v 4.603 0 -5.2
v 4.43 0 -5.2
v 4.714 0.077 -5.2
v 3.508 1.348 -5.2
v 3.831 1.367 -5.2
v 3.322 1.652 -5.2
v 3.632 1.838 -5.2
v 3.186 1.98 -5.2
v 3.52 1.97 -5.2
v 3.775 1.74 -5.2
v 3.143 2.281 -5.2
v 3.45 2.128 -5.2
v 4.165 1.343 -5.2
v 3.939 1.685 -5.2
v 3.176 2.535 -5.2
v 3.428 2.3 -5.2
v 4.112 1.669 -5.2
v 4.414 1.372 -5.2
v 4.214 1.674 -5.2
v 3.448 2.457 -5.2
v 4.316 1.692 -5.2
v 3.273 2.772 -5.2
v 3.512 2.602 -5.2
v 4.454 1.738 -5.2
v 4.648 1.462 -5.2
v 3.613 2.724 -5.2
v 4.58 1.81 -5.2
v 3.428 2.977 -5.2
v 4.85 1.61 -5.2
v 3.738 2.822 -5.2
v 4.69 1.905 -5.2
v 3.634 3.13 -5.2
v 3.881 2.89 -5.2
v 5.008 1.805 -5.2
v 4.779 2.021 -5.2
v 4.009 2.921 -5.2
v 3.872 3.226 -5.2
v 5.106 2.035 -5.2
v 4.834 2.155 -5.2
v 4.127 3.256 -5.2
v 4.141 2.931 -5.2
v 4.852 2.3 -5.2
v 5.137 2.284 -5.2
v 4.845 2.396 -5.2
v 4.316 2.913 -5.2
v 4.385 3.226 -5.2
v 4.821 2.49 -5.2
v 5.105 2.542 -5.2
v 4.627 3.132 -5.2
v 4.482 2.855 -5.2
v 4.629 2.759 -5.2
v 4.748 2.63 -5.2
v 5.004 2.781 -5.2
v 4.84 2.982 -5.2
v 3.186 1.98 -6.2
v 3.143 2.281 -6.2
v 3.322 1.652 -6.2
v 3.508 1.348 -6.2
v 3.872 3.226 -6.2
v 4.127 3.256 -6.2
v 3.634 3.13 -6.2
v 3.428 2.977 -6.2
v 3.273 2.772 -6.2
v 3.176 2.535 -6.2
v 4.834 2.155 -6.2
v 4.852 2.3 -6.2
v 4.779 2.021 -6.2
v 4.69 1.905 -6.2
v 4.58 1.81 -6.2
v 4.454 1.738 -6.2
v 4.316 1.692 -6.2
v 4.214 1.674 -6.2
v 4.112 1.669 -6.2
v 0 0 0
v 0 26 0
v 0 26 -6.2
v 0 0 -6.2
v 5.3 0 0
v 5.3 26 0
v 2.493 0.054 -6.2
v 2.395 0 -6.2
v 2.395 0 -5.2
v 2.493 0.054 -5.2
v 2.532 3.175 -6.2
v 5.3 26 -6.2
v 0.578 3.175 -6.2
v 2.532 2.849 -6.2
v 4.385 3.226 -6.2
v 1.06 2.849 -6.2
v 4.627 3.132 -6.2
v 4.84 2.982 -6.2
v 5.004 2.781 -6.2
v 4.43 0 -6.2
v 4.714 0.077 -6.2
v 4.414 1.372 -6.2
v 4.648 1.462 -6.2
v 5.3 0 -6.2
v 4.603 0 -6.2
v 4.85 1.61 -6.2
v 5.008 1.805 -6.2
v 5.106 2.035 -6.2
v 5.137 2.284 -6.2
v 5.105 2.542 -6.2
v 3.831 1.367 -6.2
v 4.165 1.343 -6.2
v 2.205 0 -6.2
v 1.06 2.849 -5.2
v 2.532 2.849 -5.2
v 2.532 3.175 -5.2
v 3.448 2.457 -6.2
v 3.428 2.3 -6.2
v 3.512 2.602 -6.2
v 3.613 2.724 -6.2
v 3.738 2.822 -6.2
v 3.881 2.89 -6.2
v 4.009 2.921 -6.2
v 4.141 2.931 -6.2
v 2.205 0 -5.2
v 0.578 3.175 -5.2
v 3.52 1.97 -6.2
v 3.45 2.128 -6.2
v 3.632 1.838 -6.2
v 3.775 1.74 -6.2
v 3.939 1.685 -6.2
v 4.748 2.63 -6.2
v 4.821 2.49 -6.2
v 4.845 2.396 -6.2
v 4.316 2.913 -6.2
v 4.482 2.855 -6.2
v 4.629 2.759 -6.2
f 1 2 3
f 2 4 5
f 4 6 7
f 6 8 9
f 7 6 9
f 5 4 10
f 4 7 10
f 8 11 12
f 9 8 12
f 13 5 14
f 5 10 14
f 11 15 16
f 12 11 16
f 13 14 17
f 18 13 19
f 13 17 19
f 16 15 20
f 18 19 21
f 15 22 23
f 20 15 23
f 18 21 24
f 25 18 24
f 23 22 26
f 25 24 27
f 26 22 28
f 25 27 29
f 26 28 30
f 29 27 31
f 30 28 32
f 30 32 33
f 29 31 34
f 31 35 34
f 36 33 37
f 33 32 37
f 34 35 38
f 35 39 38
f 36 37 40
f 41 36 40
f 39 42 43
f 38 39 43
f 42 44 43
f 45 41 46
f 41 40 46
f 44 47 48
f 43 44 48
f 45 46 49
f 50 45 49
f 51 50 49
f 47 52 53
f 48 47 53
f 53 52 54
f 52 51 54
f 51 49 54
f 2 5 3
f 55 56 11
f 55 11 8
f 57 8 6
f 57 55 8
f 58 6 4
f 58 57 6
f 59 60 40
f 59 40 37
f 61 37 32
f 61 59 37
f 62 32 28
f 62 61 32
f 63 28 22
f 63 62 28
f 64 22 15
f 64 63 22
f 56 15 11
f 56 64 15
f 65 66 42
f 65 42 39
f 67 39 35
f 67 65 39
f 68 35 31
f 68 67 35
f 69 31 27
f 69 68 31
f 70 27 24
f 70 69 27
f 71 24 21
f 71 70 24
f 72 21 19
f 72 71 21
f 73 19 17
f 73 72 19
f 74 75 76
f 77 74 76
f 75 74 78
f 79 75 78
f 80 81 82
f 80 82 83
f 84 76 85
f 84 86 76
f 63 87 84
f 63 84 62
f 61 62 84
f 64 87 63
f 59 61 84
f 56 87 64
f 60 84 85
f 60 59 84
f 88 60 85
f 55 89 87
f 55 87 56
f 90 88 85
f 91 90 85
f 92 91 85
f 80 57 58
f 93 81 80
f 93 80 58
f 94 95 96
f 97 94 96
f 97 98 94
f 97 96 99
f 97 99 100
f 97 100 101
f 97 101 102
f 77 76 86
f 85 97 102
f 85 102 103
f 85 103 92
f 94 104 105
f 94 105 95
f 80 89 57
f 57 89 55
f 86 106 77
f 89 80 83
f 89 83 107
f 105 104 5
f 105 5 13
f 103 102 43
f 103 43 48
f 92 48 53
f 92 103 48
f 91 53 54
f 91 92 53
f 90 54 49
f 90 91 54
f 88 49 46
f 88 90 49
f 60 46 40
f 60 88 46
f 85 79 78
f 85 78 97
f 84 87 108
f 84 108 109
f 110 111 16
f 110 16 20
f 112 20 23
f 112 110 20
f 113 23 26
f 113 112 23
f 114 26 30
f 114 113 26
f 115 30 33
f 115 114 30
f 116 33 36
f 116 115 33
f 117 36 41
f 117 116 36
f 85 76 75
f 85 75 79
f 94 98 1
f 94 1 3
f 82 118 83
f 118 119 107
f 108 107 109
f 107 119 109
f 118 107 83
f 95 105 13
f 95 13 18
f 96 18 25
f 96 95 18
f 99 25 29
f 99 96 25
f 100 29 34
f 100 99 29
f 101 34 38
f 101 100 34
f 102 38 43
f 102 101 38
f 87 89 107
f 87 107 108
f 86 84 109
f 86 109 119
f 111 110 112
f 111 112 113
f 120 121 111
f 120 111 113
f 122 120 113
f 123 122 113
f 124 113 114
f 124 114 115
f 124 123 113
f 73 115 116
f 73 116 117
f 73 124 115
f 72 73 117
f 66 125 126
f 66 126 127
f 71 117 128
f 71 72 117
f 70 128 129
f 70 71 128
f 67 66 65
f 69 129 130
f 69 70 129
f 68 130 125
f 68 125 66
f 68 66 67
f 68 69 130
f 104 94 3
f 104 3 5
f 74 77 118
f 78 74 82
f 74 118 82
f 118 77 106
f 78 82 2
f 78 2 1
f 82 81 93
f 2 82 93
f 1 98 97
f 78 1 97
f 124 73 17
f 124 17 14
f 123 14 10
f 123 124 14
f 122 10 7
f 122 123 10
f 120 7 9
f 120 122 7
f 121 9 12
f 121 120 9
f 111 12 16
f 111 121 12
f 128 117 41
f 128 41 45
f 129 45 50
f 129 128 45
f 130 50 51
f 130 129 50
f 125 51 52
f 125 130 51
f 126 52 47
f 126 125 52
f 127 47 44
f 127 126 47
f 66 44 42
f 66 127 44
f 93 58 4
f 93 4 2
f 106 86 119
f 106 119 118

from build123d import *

# Parameters (mm, degrees)
SKETCH1_W           = 5.3
SKETCH1_H           = 6.2
BOSS_EXTRUDE1_DEPTH = 26
CUT_EXTRUDE1_DEPTH  = 1


with BuildPart() as part:
    # Sketch1 → Boss-Extrude1 (new body)
    with BuildSketch(Plane(origin=(0, 0, 0), x_dir=(1, 0, 0), z_dir=(0, 1, 0))):
        with Locations((2.65, 3.1)):
            Rectangle(SKETCH1_W, SKETCH1_H)
    extrude(amount=BOSS_EXTRUDE1_DEPTH)

    # Sketch2 → Cut-Extrude1 (cut)
    with BuildSketch(Plane(origin=(0, 0, -6.2), x_dir=(-1, 0, 0), z_dir=(0, 0, -1))):
        with BuildLine():
            Line((-4.485897436, -0.081410256), (-4.713591747, 0.076958133))
            Line((-4.713591747, 0.076958133), (-3.830799279, 1.367437901))
            add(Edge.make_bspline(
                [(-3.830799279, 1.367437901), (-3.887124446, 1.360549907), (-3.998031841, 1.346987065), (-4.109734783, 1.344495457), (-4.164708534, 1.343269231)],
                knots=[0, 0, 0, 0, 0.000170115, 0.000334967, 0.000334967, 0.000334967, 0.000334967], degree=3))
            add(Edge.make_bspline(
                [(-4.164708534, 1.343269231), (-4.19803882, 1.344122922), (-4.263463257, 1.345798642), (-4.359649113, 1.359080854), (-4.452073872, 1.379537041), (-4.540492502, 1.410061269), (-4.625237338, 1.447996358), (-4.706123378, 1.495038078), (-4.783041736, 1.5503795), (-4.855166315, 1.613727999), (-4.920763393, 1.683285947), (-4.979204527, 1.756905709), (-5.027773982, 1.835442482), (-5.068120599, 1.917294181), (-5.098718939, 2.003637264), (-5.12100067, 2.093489219), (-5.134718806, 2.18747978), (-5.136350842, 2.251456149), (-5.137179487, 2.283939303)],
                knots=[0, 0, 0, 0, 9.9954e-05, 0.000196201, 0.000290782, 0.000383503, 0.000476303, 0.000568919, 0.000663705, 0.000760153, 0.000856434, 0.000950205, 0.001041624, 0.001132931, 0.001223461, 0.001315861, 0.001410305, 0.001507717, 0.001507717, 0.001507717, 0.001507717], degree=3))
            add(Edge.make_bspline(
                [(-5.137179487, 2.283939303), (-5.135606107, 2.328360866), (-5.132517881, 2.415551384), (-5.107663512, 2.542944875), (-5.066787347, 2.663401239), (-5.009793034, 2.776603772), (-4.938006536, 2.880924057), (-4.851729458, 2.974911867), (-4.751486576, 3.057230413), (-4.639561459, 3.127991255), (-4.518591219, 3.184900859), (-4.391891793, 3.22684651), (-4.260433984, 3.25151966), (-4.171381883, 3.254772549), (-4.126547476, 3.256410256)],
                knots=[0, 0, 0, 0, 0.000133185, 0.000261414, 0.000387724, 0.00051373, 0.000640399, 0.00076644, 0.000895188, 0.001028407, 0.001162697, 0.001295241, 0.001427846, 0.0015623, 0.0015623, 0.0015623, 0.0015623], degree=3))
            add(Edge.make_bspline(
                [(-4.126547476, 3.256410256), (-4.082561552, 3.254750037), (-3.995649514, 3.2514696), (-3.867843058, 3.227444857), (-3.745432278, 3.186953018), (-3.629095754, 3.130996306), (-3.521382145, 3.060855197), (-3.42452123, 2.977276022), (-3.34072342, 2.880206723), (-3.270126042, 2.771995021), (-3.213456791, 2.655729259), (-3.172569792, 2.53436813), (-3.147400534, 2.408784432), (-3.144228865, 2.323699445), (-3.142628205, 2.280759215)],
                knots=[0, 0, 0, 0, 0.000131915, 0.000260652, 0.000388569, 0.000517718, 0.000646848, 0.000773094, 0.000900237, 0.001030248, 0.001159674, 0.001287189, 0.001413545, 0.001542287, 0.001542287, 0.001542287, 0.001542287], degree=3))
            add(Edge.make_bspline(
                [(-3.142628205, 2.280759215), (-3.14369719, 2.247427369), (-3.14586536, 2.179822057), (-3.161047581, 2.07710596), (-3.186828749, 1.972375202), (-3.216085647, 1.883727754), (-3.244326971, 1.810513661), (-3.270907283, 1.75268187), (-3.300400451, 1.691811439), (-3.334798188, 1.628540639), (-3.371775414, 1.562062911), (-3.413557758, 1.493045019), (-3.459192098, 1.421394347), (-3.491694773, 1.373091631), (-3.508338341, 1.348357372)],
                knots=[0, 0, 0, 0, 9.9984e-05, 0.000202793, 0.000310776, 0.000423207, 0.000482616, 0.000546097, 0.000614079, 0.0006855, 0.000762103, 0.000842274, 0.000927493, 0.001016928, 0.001016928, 0.001016928, 0.001016928], degree=3))
            Line((-3.508338341, 1.348357372), (-4.485897436, -0.081410256))
        make_face()
        with BuildLine():
            add(Edge.make_bspline(
                [(-4.111919071, 1.668910256), (-4.086669643, 1.669600033), (-4.037517593, 1.670942794), (-3.965511043, 1.679115463), (-3.897544087, 1.693606151), (-3.833435168, 1.714397604), (-3.772541478, 1.739486153), (-3.715830238, 1.771428455), (-3.663253984, 1.809543545), (-3.61446065, 1.852369774), (-3.571131879, 1.899949946), (-3.532539272, 1.949749464), (-3.499736472, 2.001986932), (-3.473825499, 2.057316534), (-3.452521634, 2.11439143), (-3.43780958, 2.174130738), (-3.429659507, 2.236223216), (-3.428270149, 2.278404141), (-3.427564103, 2.299839744)],
                knots=[0, 0, 0, 0, 7.5753e-05, 0.000147465, 0.000217073, 0.000283852, 0.000349411, 0.000414338, 0.000478589, 0.000543925, 0.000608743, 0.000671332, 0.000732749, 0.000793345, 0.000854313, 0.000915245, 0.00097749, 0.001041807, 0.001041807, 0.001041807, 0.001041807], degree=3))
            add(Edge.make_bspline(
                [(-3.427564103, 2.299839744), (-3.428171588, 2.321284297), (-3.429368713, 2.36354342), (-3.438972906, 2.425727827), (-3.455868645, 2.485320999), (-3.478538584, 2.542649189), (-3.508401943, 2.597241384), (-3.544237248, 2.649782982), (-3.586811684, 2.69994084), (-3.635799726, 2.746535311), (-3.688626785, 2.78948662), (-3.744924525, 2.82739256), (-3.804228913, 2.859161788), (-3.866178143, 2.885377282), (-3.930901288, 2.905834965), (-3.998360049, 2.920546431), (-4.06889531, 2.928685094), (-4.116775476, 2.93006567), (-4.141175881, 2.930769231)],
                knots=[0, 0, 0, 0, 6.4316e-05, 0.000126743, 0.000188161, 0.000249812, 0.000311283, 0.000374438, 0.00044032, 0.000508243, 0.00057698, 0.000644365, 0.000711521, 0.0007785, 0.000845884, 0.000914871, 0.00098532, 0.001058531, 0.001058531, 0.001058531, 0.001058531], degree=3))
            add(Edge.make_bspline(
                [(-4.141175881, 2.930769231), (-4.165364078, 2.930064533), (-4.21282112, 2.928681923), (-4.282729321, 2.920561901), (-4.349731952, 2.905736026), (-4.414267565, 2.885386758), (-4.476214954, 2.859159833), (-4.535516545, 2.827390896), (-4.591827453, 2.789495345), (-4.644603864, 2.746501516), (-4.693678408, 2.700157723), (-4.735520852, 2.649563255), (-4.771438168, 2.597268715), (-4.801260492, 2.542641926), (-4.823941347, 2.485322938), (-4.840834163, 2.425727302), (-4.850439142, 2.363543557), (-4.851636159, 2.321284343), (-4.85224359, 2.299839744)],
                knots=[0, 0, 0, 0, 7.2576e-05, 0.000142393, 0.000210758, 0.000278143, 0.000345121, 0.000412278, 0.000479663, 0.0005484, 0.000616323, 0.000681795, 0.00074495, 0.000806421, 0.000868072, 0.00092949, 0.000991917, 0.001056233, 0.001056233, 0.001056233, 0.001056233], degree=3))
            add(Edge.make_bspline(
                [(-4.85224359, 2.299839744), (-4.851693928, 2.278387449), (-4.850609895, 2.236079598), (-4.840152543, 2.17391637), (-4.822664389, 2.114327794), (-4.799242513, 2.056734467), (-4.768398214, 2.001696424), (-4.730548723, 1.949474603), (-4.686184406, 1.899477016), (-4.635898314, 1.852480474), (-4.580863625, 1.809343857), (-4.52208372, 1.771669868), (-4.46057051, 1.739854151), (-4.39610746, 1.714325895), (-4.329172291, 1.693813886), (-4.259163422, 1.67914217), (-4.186312378, 1.671021185), (-4.136954752, 1.66962065), (-4.111919071, 1.668910256)],
                knots=[0, 0, 0, 0, 6.4316e-05, 0.000126844, 0.000188436, 0.000250326, 0.000312966, 0.000377217, 0.000443451, 0.000513196, 0.000583426, 0.000652939, 0.000722346, 0.000790847, 0.000860662, 0.000932137, 0.001005113, 0.00108023, 0.00108023, 0.00108023, 0.00108023], degree=3))
        make_face(mode=Mode.SUBTRACT)
        Polygon((-2.532051282, 3.175), (-0.578205128, 3.175), (-2.247115385, -0.081410256), (-2.493254207, 0.054061498), (-1.06030649, 2.849358974), (-2.532051282, 2.849358974), align=None)
    extrude(amount=-CUT_EXTRUDE1_DEPTH, mode=Mode.SUBTRACT)


solid = part.part
